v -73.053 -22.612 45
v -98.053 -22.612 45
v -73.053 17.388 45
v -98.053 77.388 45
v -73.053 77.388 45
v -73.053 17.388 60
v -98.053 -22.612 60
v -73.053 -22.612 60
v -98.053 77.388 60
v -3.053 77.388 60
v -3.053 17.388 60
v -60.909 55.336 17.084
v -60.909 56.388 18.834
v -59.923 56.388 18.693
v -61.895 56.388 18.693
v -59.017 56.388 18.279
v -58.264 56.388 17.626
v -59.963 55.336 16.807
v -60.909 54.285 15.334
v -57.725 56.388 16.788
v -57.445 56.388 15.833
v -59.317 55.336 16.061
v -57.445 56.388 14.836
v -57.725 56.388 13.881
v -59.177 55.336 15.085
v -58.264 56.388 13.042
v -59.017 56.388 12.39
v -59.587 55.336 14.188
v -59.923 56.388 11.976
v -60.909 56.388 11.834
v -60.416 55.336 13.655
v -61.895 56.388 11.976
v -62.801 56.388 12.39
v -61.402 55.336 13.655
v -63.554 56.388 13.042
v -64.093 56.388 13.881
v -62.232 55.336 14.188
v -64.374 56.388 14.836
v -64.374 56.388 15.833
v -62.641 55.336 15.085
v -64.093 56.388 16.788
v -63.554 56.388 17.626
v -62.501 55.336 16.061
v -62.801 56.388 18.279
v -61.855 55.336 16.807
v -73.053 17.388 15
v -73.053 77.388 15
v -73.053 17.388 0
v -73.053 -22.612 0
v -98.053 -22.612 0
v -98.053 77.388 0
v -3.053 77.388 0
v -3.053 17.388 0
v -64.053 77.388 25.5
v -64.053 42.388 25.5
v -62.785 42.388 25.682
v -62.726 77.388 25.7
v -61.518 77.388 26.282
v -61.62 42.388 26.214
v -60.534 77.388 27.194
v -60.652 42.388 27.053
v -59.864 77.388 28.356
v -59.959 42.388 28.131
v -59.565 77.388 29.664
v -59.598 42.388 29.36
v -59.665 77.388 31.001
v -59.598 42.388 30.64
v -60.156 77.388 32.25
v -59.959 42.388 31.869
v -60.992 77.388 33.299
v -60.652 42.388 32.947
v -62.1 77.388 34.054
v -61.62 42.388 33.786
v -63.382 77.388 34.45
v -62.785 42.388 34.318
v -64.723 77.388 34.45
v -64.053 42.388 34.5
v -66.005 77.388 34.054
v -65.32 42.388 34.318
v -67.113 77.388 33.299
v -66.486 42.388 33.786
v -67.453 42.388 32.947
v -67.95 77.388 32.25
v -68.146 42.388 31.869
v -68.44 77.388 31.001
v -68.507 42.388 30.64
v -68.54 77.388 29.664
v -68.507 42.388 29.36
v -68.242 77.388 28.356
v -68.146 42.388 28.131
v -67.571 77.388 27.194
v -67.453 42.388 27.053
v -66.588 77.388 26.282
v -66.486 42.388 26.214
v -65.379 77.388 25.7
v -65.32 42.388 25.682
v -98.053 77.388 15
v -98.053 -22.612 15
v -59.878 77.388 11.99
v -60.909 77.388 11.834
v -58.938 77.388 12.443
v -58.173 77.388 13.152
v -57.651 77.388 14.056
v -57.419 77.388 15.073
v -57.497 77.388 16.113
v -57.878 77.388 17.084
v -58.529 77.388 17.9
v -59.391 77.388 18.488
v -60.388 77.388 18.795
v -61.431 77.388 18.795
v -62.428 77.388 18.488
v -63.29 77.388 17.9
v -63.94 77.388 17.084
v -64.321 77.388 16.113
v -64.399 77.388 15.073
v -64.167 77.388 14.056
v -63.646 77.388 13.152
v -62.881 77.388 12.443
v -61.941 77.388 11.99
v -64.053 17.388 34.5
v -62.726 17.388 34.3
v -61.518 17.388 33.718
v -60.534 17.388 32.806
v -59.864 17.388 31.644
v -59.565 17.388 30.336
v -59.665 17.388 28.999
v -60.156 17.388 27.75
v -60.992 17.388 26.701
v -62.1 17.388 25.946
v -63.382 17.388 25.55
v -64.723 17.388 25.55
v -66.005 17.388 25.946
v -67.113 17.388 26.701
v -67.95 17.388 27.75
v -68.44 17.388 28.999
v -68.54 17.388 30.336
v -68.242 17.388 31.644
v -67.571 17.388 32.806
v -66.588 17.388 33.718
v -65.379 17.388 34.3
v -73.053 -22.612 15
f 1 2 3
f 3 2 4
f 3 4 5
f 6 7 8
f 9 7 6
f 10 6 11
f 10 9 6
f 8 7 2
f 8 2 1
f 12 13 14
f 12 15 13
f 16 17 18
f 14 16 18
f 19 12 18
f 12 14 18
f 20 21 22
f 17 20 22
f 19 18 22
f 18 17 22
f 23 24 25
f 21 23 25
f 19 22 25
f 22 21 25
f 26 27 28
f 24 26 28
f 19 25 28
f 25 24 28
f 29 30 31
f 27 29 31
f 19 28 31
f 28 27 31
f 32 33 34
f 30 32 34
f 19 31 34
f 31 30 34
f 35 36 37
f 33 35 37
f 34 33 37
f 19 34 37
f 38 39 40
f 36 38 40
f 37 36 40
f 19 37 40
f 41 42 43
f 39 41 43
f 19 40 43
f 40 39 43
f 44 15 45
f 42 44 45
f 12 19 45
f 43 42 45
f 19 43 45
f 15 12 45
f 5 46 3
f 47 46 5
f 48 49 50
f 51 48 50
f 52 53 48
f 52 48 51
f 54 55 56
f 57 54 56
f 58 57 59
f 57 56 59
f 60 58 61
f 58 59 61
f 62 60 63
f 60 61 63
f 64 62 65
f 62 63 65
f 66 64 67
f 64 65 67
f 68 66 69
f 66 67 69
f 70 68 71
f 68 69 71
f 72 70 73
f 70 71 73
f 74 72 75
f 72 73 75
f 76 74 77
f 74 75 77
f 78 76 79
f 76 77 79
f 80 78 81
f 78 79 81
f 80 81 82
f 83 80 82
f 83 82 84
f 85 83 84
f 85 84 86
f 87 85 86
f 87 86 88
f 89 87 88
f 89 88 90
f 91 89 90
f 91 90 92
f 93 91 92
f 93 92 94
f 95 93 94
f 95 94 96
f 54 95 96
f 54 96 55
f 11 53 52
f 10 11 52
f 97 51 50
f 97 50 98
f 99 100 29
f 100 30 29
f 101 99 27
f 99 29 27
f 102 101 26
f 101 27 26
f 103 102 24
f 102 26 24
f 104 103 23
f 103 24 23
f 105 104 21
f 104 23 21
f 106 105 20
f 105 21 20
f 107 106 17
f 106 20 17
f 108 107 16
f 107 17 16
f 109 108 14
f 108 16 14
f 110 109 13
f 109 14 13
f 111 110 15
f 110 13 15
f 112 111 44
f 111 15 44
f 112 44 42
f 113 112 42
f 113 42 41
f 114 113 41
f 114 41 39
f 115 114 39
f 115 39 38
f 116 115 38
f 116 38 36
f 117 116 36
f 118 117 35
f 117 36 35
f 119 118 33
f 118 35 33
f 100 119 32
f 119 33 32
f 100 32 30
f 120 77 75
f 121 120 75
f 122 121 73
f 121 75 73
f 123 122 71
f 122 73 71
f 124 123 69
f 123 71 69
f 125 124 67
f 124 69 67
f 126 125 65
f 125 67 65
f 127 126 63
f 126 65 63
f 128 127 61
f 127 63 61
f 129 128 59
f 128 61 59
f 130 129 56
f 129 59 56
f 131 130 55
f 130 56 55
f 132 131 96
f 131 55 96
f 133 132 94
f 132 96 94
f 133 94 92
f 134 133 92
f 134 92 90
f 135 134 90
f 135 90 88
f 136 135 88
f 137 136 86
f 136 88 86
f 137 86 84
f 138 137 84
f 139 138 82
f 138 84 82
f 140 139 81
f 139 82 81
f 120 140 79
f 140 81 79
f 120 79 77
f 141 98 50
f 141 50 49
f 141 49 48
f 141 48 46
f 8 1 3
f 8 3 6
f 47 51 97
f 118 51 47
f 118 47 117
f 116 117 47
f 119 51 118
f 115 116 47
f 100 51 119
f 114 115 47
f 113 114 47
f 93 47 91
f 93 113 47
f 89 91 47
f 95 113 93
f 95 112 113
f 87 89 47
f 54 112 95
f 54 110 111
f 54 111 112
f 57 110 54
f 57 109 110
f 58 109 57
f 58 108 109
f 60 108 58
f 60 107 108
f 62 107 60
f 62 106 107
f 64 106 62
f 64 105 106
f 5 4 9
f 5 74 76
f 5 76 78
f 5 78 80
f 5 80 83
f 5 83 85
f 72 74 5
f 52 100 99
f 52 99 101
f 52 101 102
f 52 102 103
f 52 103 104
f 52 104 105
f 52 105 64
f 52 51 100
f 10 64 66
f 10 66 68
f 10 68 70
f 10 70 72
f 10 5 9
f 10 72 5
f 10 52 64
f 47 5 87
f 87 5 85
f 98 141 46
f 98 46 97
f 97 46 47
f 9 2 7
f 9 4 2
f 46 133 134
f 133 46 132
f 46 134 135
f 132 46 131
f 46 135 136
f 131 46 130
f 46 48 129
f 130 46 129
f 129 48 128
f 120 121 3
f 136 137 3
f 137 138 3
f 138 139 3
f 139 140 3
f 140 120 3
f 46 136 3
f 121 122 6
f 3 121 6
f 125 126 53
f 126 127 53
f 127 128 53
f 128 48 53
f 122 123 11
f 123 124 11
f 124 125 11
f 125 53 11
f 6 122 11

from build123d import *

# Parameters (mm, degrees)
ESQUISSE1_W                = 70
ESQUISSE1_H                = 60
BOSS_EXTRU_1_DEPTH         = 60
ESQUISSE2_W                = 15
ESQUISSE2_H                = 60
BOSS_EXTRU_2_DEPTH         = 25
ESQUISSE3_W                = 25
ESQUISSE3_H                = 15
BOSS_EXTRU_3_DEPTH         = 40
TROU_TARAUD_M8X1_01_D      = 7
TROU_TARAUD_M8X1_01_DEPTH  = 21
TROU_TARAUD_M8X1_01_TIP    = 2.103012167
TROU_TARAUD_M10X1_02_D     = 9
TROU_TARAUD_M10X1_02_DEPTH = 25
TROU_TARAUD_M10X1_02_TIP   = 2.703872786
ENL_V_MAT_EXTRU_3_REACH    = 131.67
ESQUISSE4_R                = 4.5


with BuildPart() as part:
    # Esquisse1 → Boss.-Extru.1 (new body)
    with BuildSketch(Plane.XY):
        with Locations((-38.052617229, 47.387919463)):
            Rectangle(ESQUISSE1_W, ESQUISSE1_H)
    extrude(amount=BOSS_EXTRU_1_DEPTH)

    # Esquisse2 → Boss.-Extru.2 (add)
    with BuildSketch(Plane.ZY.offset(73.052617229)):
        with Locations((7.5, 47.387919463)):
            Rectangle(ESQUISSE2_W, ESQUISSE2_H)
        with Locations((52.5, 47.387919463)):
            Rectangle(ESQUISSE2_W, ESQUISSE2_H)
    extrude(amount=BOSS_EXTRU_2_DEPTH)

    # Esquisse3 → Boss.-Extru.3 (add)
    with BuildSketch(Plane.XZ.offset(-17.387919463)):
        with Locations((-85.552617229, 52.5)):
            Rectangle(ESQUISSE3_W, ESQUISSE3_H)
        with Locations((-85.552617229, 7.5)):
            Rectangle(ESQUISSE3_W, ESQUISSE3_H)
    extrude(amount=BOSS_EXTRU_3_DEPTH)

    # Trou taraudé M8x1.01
    with Locations(Plane(origin=(-60.909201033, 77.387919463, 15.33448507), x_dir=(0, 0, 1), z_dir=(0, 1, 0))):
        with Locations((0, 0)):
            Hole(TROU_TARAUD_M8X1_01_D / 2, depth=TROU_TARAUD_M8X1_01_DEPTH)
            with Locations((0, 0, -(TROU_TARAUD_M8X1_01_DEPTH + TROU_TARAUD_M8X1_01_TIP / 2))):  # 118° drill point
                Cone(0, TROU_TARAUD_M8X1_01_D / 2, TROU_TARAUD_M8X1_01_TIP, mode=Mode.SUBTRACT)

    # Trou taraudé M10x1.02
    with Locations(Plane(origin=(-64.052617229, 17.387919463, 30), x_dir=(0, 0, -1), z_dir=(0, -1, 0))):
        with Locations((0, 0)):
            Hole(TROU_TARAUD_M10X1_02_D / 2, depth=TROU_TARAUD_M10X1_02_DEPTH)
            with Locations((0, 0, -(TROU_TARAUD_M10X1_02_DEPTH + TROU_TARAUD_M10X1_02_TIP / 2))):  # 118° drill point
                Cone(0, TROU_TARAUD_M10X1_02_D / 2, TROU_TARAUD_M10X1_02_TIP, mode=Mode.SUBTRACT)

    # Esquisse4 → Enlèv. mat.-Extru.3 (cut, up to next)
    with BuildSketch(Plane.XZ.offset(-17.387919463), mode=Mode.PRIVATE) as enl_v_mat_extru_3_sk1:
        with Locations(Location((-64.052617229, 30, 0), (0, 0, 270))):
            Circle(ESQUISSE4_R)
    enl_v_mat_extru_3_tool1 = extrude(enl_v_mat_extru_3_sk1.sketch, amount=-ENL_V_MAT_EXTRU_3_REACH, mode=Mode.PRIVATE) & part.part
    add(enl_v_mat_extru_3_tool1.solids().sort_by_distance((-64.052617, 17.387919, 30))[0], mode=Mode.SUBTRACT)


solid = part.part
